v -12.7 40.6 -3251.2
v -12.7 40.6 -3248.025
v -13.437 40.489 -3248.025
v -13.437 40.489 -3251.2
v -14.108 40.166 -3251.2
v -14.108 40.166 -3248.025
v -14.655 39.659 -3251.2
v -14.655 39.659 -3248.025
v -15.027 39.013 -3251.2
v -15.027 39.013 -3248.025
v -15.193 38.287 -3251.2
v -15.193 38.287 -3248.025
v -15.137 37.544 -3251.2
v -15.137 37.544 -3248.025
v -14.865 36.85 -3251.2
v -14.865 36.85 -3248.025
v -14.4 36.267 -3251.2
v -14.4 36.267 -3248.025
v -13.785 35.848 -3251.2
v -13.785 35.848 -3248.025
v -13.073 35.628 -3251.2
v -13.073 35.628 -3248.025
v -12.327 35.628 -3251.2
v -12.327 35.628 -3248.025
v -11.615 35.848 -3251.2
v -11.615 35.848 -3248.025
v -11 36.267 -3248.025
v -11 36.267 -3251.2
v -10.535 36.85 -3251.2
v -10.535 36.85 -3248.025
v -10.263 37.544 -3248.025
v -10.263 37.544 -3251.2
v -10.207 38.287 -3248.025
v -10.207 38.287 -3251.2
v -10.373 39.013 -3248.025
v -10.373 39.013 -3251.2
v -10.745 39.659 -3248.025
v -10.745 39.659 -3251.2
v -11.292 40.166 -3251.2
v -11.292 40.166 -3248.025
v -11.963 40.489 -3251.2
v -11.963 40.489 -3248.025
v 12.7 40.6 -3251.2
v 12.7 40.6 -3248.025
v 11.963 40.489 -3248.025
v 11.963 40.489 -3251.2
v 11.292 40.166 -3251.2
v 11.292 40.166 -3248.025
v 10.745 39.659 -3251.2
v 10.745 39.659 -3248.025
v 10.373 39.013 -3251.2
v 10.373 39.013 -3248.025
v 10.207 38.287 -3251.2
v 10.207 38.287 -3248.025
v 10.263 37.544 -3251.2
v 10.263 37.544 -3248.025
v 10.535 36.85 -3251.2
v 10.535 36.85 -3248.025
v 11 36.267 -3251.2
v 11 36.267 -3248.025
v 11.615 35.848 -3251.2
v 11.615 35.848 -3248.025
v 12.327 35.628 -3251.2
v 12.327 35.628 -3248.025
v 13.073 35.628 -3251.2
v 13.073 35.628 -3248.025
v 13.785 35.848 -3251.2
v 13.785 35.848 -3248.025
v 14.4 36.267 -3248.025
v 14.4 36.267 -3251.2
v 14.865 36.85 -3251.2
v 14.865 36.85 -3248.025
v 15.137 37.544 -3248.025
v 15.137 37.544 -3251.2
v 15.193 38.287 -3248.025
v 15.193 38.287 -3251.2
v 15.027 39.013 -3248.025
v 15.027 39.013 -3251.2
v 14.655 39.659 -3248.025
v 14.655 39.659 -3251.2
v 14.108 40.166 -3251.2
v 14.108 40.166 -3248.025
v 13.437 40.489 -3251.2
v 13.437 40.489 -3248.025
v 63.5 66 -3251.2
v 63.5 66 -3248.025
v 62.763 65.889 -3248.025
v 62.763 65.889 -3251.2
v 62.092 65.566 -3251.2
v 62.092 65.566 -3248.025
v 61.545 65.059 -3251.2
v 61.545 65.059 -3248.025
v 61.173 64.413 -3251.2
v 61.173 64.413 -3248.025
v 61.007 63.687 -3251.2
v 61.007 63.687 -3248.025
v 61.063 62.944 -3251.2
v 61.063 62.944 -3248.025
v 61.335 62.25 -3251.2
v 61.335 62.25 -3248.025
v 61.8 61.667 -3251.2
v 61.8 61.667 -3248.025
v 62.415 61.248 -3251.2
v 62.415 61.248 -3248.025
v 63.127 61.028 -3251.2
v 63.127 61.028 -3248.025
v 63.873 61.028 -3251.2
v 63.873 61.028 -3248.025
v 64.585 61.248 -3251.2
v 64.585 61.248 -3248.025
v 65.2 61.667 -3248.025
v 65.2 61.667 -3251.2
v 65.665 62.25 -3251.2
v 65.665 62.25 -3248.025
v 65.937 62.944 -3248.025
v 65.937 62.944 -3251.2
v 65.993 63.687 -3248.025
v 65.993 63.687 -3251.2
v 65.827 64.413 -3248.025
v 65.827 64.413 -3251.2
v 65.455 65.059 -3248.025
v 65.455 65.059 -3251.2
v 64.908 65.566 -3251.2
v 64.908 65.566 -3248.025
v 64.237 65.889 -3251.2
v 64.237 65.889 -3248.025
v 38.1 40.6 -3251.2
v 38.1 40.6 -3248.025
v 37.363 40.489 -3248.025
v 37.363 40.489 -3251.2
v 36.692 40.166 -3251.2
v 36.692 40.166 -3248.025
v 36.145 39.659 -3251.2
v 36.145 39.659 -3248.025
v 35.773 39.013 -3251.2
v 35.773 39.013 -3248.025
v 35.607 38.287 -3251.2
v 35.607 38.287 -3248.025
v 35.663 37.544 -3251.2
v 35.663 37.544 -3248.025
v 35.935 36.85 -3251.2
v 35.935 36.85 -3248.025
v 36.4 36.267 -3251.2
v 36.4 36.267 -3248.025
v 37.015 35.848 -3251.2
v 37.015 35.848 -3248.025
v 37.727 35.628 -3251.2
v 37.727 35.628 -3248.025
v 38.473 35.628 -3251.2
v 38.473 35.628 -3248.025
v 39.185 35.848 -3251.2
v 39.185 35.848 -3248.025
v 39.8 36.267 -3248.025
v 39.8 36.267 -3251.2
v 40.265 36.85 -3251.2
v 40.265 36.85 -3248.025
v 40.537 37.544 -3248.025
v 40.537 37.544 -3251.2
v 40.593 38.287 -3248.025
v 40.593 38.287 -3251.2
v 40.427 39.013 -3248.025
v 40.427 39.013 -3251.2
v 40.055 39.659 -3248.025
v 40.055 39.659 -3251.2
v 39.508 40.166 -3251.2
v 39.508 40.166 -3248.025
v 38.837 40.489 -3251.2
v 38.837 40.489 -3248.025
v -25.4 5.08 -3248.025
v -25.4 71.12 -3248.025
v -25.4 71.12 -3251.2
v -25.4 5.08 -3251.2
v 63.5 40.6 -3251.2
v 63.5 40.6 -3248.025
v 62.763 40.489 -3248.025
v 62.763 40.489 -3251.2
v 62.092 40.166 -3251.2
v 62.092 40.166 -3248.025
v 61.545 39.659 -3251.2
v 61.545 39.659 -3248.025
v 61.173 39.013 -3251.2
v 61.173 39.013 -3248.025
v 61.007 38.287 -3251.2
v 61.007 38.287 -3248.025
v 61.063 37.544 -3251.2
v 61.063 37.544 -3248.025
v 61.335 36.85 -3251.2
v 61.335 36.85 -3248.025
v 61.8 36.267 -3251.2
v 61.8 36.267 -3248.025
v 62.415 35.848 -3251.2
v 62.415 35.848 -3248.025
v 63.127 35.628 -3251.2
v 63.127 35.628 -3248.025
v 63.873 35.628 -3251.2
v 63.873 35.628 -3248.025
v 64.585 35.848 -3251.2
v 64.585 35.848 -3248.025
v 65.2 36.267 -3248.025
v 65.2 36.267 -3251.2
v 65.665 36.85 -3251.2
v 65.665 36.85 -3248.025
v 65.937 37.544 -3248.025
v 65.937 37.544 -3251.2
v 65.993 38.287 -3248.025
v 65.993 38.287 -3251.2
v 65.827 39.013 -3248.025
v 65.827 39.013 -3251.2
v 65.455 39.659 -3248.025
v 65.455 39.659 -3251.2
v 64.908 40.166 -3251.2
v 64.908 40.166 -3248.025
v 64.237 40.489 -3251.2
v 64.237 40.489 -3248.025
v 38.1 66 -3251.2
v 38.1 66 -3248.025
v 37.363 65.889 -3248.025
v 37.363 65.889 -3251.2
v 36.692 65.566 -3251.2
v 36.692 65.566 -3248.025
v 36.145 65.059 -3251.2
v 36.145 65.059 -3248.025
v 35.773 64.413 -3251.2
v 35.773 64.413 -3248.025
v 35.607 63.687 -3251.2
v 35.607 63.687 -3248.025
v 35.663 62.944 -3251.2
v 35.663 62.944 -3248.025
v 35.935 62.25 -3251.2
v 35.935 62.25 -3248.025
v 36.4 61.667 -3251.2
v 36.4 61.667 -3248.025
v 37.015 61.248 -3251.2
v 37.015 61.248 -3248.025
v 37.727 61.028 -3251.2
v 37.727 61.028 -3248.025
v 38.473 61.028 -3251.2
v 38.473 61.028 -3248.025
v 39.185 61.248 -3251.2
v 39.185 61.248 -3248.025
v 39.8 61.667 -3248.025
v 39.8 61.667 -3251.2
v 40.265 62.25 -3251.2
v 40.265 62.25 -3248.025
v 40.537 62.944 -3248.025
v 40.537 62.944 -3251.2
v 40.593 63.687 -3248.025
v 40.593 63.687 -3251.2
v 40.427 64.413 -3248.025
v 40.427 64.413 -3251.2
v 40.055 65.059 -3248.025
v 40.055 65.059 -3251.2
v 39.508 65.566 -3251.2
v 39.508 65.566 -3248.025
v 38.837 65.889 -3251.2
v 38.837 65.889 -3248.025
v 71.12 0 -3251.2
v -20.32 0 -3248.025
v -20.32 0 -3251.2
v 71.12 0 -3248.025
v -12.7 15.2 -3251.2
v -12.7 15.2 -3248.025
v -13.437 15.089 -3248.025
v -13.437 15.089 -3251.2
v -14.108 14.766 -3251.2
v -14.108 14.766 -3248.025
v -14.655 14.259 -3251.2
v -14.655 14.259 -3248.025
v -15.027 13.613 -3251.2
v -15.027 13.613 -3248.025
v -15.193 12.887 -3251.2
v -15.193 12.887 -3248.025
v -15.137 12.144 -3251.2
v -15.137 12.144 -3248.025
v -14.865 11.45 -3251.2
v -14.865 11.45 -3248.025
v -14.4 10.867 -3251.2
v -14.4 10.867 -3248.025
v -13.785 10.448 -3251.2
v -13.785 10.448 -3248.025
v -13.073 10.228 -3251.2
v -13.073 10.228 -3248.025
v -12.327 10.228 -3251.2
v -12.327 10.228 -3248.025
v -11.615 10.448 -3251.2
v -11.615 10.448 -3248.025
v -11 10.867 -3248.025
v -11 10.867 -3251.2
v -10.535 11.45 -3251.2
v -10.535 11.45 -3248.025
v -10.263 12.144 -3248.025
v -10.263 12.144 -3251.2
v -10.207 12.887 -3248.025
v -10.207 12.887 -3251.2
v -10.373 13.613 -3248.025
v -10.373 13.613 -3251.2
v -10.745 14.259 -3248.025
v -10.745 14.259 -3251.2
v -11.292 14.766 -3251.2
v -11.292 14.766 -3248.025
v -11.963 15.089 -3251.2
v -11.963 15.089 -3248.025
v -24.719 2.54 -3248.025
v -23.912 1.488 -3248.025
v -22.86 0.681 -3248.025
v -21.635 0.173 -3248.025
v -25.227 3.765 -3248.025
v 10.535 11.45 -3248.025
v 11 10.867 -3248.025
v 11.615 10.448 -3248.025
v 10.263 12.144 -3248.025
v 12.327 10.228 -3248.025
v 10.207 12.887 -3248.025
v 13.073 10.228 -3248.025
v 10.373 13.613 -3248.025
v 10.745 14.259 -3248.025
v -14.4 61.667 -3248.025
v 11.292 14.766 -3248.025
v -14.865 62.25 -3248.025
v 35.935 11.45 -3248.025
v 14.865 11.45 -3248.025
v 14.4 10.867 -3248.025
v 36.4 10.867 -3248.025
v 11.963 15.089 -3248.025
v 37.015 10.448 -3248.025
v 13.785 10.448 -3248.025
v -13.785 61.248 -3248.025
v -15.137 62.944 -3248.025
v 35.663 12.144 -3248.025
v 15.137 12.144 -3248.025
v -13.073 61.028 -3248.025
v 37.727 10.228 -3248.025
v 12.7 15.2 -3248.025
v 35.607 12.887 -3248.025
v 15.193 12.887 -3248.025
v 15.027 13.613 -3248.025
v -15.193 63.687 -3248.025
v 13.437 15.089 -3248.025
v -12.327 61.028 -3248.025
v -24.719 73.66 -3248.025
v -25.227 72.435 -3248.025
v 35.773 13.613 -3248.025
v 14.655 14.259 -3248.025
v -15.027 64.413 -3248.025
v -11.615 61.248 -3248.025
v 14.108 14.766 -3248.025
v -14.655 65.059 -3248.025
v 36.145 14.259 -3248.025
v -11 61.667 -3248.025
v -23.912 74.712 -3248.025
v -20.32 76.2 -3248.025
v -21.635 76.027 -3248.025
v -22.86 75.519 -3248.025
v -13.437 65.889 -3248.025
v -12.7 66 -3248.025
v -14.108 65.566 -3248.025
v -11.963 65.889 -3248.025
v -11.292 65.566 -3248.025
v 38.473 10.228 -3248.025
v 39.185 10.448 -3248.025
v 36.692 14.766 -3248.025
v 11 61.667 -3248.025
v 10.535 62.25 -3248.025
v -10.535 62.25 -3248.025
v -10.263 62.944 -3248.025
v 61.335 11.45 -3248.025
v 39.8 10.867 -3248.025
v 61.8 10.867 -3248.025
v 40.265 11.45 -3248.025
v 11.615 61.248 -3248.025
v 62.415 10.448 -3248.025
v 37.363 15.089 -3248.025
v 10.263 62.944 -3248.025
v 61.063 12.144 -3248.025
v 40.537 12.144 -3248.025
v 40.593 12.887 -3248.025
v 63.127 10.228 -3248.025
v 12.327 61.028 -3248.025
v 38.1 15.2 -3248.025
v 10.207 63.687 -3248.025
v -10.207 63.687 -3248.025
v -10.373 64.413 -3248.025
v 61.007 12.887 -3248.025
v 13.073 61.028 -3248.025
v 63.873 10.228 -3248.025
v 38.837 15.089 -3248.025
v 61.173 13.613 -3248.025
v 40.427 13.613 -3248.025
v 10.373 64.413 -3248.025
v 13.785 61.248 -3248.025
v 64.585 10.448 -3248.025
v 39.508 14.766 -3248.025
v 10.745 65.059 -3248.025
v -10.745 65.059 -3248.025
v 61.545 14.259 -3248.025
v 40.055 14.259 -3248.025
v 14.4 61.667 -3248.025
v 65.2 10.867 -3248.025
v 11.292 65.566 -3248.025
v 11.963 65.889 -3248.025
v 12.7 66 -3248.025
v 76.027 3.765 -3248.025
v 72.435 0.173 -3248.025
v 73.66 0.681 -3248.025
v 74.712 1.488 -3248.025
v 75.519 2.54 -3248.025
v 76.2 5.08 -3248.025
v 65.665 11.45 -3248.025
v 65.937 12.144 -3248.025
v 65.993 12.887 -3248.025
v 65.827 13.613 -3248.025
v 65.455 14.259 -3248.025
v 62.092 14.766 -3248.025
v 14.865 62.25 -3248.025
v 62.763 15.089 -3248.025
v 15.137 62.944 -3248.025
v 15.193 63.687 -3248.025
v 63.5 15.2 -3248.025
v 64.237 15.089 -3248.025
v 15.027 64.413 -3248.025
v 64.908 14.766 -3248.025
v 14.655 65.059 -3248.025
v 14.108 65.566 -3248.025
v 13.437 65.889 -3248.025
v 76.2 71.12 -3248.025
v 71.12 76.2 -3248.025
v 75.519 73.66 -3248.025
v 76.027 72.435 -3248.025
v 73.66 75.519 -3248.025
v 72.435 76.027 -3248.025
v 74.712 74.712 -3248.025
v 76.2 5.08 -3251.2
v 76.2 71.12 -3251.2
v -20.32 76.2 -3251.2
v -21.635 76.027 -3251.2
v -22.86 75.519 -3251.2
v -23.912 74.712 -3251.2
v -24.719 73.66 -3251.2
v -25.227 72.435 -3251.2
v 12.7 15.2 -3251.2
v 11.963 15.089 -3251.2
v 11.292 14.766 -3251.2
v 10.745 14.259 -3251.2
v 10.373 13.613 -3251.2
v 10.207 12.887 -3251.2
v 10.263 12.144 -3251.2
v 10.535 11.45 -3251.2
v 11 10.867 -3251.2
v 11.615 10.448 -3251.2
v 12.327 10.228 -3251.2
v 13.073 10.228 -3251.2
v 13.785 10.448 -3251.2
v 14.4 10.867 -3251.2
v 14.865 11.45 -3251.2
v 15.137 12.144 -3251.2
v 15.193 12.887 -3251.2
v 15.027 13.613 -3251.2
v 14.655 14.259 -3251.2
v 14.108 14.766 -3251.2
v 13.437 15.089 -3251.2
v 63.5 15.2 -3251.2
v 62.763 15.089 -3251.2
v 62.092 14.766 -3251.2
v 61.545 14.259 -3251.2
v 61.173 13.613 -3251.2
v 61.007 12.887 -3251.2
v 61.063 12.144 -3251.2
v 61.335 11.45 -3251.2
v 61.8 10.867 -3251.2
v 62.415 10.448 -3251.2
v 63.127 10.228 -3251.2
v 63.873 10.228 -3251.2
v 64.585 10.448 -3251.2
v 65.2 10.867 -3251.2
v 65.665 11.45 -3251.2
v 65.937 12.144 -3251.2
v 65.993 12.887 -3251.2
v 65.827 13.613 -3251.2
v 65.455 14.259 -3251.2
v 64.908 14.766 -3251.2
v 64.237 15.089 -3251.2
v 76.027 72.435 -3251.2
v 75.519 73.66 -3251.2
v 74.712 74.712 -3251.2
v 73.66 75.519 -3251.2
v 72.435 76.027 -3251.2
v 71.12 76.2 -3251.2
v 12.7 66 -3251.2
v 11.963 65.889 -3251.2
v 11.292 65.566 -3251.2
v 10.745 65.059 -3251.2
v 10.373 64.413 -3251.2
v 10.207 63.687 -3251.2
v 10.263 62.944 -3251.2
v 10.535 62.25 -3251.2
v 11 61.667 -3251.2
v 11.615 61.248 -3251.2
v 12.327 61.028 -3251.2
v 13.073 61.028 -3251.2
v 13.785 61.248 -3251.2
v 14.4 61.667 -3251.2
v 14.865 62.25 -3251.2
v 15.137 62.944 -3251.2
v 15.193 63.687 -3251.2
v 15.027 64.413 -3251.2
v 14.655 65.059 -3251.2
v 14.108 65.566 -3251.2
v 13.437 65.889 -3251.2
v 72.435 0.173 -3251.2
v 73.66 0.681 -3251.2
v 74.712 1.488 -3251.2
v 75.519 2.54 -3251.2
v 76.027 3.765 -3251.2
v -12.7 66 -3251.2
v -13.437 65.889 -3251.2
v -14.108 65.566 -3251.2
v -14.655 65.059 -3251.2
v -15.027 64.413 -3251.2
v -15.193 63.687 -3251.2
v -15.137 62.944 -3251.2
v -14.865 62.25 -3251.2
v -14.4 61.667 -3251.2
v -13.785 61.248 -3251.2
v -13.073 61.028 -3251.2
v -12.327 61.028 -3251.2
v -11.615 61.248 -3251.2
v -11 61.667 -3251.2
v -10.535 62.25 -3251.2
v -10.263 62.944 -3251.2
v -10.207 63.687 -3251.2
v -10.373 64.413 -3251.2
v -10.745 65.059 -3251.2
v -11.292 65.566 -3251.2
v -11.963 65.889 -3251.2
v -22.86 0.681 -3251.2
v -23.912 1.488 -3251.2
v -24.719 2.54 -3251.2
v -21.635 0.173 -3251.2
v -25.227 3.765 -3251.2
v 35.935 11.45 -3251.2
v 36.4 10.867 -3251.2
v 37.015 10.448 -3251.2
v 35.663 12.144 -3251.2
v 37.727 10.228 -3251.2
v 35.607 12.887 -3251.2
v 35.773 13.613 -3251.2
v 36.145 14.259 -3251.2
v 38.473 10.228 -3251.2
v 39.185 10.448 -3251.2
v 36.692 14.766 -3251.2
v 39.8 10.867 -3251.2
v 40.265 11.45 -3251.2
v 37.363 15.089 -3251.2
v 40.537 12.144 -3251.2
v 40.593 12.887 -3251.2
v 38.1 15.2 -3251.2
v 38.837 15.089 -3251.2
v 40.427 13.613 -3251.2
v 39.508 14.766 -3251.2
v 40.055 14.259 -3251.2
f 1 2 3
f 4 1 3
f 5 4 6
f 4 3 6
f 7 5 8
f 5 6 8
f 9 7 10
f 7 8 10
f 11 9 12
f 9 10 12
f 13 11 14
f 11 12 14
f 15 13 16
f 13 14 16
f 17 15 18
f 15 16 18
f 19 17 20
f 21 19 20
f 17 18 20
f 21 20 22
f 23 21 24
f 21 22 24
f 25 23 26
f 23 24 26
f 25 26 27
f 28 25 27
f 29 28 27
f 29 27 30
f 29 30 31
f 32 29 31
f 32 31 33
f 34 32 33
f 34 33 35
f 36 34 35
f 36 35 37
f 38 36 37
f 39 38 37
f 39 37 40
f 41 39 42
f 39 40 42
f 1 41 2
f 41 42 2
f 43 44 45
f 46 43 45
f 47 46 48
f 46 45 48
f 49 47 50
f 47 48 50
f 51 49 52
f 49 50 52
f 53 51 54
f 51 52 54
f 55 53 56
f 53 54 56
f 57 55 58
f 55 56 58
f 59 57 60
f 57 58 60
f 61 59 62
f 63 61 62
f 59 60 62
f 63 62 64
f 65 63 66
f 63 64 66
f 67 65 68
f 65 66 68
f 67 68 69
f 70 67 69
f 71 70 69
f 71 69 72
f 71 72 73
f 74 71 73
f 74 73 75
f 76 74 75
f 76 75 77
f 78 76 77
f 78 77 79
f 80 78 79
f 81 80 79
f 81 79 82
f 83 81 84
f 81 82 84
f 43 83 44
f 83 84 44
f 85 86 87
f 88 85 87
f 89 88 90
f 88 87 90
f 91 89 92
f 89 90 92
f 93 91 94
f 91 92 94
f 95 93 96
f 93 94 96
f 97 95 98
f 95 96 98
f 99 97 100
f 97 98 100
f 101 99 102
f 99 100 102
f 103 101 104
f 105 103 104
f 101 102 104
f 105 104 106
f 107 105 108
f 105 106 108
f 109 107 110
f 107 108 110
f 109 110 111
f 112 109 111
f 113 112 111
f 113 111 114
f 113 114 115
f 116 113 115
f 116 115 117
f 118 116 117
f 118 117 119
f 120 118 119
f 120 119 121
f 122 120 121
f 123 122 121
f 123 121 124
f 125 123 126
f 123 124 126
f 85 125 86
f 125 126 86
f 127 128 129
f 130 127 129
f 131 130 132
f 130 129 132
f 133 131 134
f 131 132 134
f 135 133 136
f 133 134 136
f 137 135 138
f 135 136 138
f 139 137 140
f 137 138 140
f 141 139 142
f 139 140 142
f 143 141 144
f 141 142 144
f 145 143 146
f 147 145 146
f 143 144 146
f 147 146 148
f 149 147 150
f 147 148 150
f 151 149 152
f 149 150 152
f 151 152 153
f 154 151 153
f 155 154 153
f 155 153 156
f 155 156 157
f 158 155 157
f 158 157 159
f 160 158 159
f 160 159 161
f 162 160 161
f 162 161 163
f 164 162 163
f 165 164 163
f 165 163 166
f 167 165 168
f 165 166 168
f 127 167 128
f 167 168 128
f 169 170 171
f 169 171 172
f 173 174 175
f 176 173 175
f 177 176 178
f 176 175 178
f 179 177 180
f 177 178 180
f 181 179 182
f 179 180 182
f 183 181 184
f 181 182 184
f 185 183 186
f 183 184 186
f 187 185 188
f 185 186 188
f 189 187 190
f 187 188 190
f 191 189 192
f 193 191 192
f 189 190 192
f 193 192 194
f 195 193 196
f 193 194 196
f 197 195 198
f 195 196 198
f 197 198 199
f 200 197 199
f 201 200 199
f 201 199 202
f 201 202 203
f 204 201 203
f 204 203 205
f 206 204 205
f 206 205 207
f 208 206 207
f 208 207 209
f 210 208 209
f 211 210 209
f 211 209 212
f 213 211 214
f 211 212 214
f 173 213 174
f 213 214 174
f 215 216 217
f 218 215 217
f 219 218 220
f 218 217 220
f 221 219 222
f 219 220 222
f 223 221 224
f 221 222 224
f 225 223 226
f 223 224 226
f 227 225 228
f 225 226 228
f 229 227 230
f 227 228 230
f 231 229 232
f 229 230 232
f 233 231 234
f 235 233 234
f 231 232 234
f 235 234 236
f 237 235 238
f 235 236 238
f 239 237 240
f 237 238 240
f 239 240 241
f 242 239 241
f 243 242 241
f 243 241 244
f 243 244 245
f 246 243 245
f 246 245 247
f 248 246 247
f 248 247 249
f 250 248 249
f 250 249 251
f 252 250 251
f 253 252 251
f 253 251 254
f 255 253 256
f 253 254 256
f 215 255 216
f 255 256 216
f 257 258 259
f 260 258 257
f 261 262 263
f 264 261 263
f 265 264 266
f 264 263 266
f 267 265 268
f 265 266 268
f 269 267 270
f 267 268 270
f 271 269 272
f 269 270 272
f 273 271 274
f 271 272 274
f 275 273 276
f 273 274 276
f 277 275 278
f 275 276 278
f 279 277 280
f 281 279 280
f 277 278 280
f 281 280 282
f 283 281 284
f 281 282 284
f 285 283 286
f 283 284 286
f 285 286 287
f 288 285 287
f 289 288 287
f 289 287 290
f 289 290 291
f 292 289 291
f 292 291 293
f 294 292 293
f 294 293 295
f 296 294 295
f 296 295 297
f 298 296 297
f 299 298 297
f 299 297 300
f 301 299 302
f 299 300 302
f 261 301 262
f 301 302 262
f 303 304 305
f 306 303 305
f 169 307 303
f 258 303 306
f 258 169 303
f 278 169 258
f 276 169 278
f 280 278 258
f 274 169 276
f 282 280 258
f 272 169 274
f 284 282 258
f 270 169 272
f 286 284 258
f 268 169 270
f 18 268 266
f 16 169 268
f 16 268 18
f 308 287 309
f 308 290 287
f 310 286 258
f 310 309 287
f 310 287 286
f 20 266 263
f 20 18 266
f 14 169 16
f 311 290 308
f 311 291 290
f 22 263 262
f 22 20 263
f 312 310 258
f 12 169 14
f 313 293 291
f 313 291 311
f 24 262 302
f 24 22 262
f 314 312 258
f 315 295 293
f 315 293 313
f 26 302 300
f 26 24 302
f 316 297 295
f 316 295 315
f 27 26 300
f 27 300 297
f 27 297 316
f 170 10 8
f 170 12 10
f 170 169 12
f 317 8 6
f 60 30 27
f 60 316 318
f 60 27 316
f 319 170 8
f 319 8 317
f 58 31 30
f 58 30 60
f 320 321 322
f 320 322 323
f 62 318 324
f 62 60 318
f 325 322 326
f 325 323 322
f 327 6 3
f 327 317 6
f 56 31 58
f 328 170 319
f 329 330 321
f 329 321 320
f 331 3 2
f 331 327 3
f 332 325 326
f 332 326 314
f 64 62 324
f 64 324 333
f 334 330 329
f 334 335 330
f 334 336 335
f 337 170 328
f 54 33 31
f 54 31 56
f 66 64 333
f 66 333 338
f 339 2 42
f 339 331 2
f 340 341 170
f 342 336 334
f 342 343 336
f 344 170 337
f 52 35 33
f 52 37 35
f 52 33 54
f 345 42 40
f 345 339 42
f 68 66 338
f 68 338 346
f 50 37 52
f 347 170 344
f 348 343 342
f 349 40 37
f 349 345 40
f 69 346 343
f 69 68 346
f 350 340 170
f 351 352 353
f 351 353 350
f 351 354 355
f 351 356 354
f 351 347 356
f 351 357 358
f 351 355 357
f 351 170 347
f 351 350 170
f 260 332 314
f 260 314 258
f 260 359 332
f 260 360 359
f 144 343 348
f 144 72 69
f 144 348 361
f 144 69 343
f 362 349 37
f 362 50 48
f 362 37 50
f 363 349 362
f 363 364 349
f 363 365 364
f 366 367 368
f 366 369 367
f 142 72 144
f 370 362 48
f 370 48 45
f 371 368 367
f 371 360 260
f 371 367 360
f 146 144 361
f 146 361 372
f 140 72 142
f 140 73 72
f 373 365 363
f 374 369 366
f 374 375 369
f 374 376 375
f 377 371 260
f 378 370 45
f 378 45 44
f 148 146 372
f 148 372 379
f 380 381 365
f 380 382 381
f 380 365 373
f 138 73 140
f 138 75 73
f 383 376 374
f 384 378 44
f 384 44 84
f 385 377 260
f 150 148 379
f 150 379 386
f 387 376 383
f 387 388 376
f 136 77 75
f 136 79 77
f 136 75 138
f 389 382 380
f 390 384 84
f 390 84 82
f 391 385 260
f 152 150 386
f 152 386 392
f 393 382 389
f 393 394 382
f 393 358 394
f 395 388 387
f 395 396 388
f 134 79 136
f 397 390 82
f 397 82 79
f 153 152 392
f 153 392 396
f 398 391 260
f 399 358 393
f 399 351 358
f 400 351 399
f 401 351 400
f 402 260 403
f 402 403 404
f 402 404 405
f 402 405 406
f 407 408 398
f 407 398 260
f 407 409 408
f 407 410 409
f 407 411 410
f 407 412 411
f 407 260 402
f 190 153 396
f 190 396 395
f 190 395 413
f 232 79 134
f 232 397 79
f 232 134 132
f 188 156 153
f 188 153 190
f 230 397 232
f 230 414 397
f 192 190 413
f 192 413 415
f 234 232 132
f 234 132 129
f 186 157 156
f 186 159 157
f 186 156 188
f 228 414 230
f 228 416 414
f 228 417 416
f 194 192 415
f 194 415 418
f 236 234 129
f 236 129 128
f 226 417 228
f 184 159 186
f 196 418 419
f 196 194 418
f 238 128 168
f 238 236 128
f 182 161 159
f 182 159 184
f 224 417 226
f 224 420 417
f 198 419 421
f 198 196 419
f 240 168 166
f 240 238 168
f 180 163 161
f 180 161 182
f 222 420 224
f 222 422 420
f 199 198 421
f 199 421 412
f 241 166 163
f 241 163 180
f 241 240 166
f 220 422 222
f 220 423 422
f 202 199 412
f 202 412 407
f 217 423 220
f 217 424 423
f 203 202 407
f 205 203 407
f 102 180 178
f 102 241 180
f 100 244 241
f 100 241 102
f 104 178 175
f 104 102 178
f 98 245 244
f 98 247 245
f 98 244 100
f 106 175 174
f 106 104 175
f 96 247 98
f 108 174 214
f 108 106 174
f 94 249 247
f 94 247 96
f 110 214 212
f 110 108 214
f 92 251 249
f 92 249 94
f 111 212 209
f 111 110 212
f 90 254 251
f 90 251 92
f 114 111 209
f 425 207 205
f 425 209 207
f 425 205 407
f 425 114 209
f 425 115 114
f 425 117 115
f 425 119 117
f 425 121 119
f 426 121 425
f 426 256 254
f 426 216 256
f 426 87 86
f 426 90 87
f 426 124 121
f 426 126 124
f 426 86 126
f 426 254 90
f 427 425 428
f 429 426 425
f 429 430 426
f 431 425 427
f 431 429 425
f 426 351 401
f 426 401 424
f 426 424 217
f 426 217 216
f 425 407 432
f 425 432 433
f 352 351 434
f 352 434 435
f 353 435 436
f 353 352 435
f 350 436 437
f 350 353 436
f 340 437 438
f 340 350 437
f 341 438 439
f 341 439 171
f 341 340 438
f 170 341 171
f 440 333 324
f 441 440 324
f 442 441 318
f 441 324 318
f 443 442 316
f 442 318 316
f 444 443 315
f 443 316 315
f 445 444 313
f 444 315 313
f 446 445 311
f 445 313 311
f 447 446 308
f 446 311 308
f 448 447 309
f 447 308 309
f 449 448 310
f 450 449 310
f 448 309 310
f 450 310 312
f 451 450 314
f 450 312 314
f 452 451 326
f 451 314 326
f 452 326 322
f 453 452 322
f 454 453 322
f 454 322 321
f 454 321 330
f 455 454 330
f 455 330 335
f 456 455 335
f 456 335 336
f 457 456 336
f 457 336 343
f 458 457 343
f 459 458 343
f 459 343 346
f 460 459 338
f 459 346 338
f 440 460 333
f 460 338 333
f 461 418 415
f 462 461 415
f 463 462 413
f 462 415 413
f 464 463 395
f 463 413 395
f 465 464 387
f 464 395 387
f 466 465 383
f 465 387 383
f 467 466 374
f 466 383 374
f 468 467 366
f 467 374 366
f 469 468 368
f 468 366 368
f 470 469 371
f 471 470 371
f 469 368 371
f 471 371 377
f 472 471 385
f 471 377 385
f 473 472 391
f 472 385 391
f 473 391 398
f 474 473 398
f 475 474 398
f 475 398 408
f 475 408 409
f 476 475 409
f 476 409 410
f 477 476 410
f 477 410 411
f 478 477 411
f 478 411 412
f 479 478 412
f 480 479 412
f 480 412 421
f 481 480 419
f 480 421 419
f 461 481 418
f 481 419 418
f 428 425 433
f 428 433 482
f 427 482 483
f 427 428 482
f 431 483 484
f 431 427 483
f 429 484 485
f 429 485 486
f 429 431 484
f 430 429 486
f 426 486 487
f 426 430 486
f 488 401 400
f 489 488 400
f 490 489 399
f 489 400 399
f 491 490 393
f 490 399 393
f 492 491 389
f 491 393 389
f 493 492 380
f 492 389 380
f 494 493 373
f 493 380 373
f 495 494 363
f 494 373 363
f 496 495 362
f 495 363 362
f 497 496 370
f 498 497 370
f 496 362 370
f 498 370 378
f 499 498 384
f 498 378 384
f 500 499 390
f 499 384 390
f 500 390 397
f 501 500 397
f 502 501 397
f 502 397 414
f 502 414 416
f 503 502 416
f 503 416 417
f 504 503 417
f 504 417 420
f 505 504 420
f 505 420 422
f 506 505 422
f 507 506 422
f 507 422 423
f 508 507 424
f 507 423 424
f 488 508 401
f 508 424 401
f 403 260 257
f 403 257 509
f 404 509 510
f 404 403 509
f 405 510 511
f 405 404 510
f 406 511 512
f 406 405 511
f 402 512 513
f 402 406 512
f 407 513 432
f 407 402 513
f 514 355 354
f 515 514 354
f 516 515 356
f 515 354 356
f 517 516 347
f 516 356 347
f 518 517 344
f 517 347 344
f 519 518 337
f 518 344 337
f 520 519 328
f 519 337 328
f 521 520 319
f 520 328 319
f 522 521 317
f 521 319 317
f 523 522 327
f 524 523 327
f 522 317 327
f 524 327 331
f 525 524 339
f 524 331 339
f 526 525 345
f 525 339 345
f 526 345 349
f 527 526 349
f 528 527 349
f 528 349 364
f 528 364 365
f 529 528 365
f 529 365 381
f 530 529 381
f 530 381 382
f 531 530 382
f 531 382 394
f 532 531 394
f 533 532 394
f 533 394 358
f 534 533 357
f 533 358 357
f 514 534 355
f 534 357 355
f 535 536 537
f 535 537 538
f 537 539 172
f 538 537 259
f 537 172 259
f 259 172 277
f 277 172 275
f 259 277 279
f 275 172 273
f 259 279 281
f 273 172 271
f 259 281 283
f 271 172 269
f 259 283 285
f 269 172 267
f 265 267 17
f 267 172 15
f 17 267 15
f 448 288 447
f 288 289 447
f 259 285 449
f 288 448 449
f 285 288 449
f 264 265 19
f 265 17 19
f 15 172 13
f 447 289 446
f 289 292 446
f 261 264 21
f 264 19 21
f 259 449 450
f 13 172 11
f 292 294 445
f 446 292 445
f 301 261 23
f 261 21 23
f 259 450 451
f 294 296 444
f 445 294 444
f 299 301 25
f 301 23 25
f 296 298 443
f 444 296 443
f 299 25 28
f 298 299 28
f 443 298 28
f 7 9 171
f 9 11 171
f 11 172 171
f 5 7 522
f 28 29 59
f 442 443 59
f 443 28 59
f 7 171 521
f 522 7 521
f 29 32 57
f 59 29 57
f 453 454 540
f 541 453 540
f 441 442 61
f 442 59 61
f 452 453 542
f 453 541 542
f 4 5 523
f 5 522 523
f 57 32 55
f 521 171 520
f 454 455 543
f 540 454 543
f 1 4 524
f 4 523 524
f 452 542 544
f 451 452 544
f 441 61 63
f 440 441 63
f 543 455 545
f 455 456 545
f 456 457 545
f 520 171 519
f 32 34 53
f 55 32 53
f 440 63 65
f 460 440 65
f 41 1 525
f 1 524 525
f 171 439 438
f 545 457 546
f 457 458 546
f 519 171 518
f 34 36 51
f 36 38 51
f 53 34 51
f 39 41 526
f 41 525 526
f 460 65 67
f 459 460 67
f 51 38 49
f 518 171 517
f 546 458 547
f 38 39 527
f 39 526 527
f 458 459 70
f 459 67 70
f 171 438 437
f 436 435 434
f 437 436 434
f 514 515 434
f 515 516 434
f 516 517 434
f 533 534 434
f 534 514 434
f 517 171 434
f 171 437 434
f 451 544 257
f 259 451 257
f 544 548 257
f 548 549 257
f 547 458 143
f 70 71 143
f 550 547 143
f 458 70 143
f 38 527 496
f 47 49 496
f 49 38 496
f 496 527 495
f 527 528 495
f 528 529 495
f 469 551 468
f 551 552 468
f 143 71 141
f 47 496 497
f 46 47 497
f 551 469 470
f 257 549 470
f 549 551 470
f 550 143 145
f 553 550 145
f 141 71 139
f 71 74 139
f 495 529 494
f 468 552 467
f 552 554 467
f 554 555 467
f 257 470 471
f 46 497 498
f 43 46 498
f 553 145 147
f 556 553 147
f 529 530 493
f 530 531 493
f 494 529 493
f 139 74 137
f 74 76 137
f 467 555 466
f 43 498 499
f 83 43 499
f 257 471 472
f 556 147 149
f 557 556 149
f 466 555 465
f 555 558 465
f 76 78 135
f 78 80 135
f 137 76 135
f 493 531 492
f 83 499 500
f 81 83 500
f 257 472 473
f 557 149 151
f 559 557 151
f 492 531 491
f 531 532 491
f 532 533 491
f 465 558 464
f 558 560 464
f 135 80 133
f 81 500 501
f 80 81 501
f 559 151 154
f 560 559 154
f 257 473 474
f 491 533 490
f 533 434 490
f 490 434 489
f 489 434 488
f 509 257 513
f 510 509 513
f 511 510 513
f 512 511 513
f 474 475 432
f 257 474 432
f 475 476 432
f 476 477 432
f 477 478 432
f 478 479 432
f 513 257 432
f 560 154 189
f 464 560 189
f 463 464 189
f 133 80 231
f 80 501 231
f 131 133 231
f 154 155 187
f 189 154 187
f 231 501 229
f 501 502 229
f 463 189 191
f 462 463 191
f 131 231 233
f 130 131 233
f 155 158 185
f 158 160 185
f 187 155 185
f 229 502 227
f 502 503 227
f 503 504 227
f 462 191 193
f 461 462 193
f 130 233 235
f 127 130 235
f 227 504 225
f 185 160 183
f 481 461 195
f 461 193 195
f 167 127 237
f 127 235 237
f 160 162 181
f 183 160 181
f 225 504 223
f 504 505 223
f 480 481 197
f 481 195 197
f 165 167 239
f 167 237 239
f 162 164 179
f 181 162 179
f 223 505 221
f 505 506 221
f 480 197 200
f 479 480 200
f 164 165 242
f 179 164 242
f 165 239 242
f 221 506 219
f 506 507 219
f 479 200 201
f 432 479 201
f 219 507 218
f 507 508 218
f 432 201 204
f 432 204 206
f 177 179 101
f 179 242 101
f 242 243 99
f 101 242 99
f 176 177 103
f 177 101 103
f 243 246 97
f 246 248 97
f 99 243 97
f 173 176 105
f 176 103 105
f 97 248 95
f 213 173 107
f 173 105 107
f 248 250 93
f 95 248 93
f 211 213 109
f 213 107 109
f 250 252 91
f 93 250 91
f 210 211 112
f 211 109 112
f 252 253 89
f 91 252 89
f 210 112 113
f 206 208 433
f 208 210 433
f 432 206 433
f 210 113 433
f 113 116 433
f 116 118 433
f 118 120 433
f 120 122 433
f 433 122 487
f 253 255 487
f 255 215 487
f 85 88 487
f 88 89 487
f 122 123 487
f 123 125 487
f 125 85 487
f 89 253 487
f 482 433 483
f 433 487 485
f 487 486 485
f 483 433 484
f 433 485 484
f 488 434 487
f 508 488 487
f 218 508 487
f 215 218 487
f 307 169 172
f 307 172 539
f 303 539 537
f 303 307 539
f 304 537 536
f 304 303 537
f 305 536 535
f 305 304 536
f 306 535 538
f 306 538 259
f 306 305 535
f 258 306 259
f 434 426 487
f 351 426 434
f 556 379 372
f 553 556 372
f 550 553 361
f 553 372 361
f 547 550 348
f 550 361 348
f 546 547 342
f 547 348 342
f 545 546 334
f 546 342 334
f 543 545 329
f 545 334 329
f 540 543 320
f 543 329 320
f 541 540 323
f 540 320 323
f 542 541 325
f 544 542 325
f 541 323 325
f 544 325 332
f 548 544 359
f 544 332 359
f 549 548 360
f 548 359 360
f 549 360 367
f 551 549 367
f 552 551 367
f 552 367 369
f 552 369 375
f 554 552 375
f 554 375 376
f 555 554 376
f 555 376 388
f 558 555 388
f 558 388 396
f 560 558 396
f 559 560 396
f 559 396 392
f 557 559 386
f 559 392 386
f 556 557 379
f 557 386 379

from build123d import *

# Parameters (mm, degrees)
BOSS_EXTRUDE1_START = -3248.025
SKETCH1_R           = 2.5
BOSS_EXTRUDE1_DEPTH = 3.175


with BuildPart() as part:
    # Sketch1 → Boss-Extrude1 (new body)
    with BuildSketch(Plane.XY.offset(BOSS_EXTRUDE1_START)):
        with BuildLine():
            Line((71.12, 76.200000002), (-20.32, 76.200000002))
            ThreePointArc((-20.32, 76.200000002), (-23.912102448, 74.71210245), (-25.4, 71.120000002))
            Line((-25.4, 71.120000002), (-25.4, 5.08))
            ThreePointArc((-25.4, 5.08), (-23.912102448, 1.487897552), (-20.32, 0))
            Line((-20.32, 0), (71.12, 0))
            ThreePointArc((71.12, 0), (74.712102448, 1.487897552), (76.2, 5.08))
            Line((76.2, 5.08), (76.2, 71.120000002))
            ThreePointArc((76.2, 71.120000002), (74.712102448, 74.71210245), (71.12, 76.200000002))
        make_face()
        with Locations(Location((63.5, 63.5, 0), (0, 0, 90))):
            Circle(SKETCH1_R, mode=Mode.SUBTRACT)
        with Locations(Location((63.5, 38.1, 0), (0, 0, 90))):
            Circle(SKETCH1_R, mode=Mode.SUBTRACT)
        with Locations(Location((-12.7, 63.5, 0), (0, 0, 90))):
            Circle(SKETCH1_R, mode=Mode.SUBTRACT)
        with Locations(Location((12.7, 63.5, 0), (0, 0, 90))):
            Circle(SKETCH1_R, mode=Mode.SUBTRACT)
        with Locations(Location((38.1, 63.5, 0), (0, 0, 90))):
            Circle(SKETCH1_R, mode=Mode.SUBTRACT)
        with Locations(Location((-12.7, 38.1, 0), (0, 0, 90))):
            Circle(SKETCH1_R, mode=Mode.SUBTRACT)
        with Locations(Location((12.7, 38.1, 0), (0, 0, 90))):
            Circle(SKETCH1_R, mode=Mode.SUBTRACT)
        with Locations(Location((38.1, 38.1, 0), (0, 0, 90))):
            Circle(SKETCH1_R, mode=Mode.SUBTRACT)
        with Locations(Location((38.1, 12.7, 0), (0, 0, 90))):
            Circle(SKETCH1_R, mode=Mode.SUBTRACT)
        with Locations(Location((12.7, 12.7, 0), (0, 0, 90))):
            Circle(SKETCH1_R, mode=Mode.SUBTRACT)
        with Locations(Location((-12.7, 12.7, 0), (0, 0, 90))):
            Circle(SKETCH1_R, mode=Mode.SUBTRACT)
        with Locations(Location((63.5, 12.7, 0), (0, 0, 90))):
            Circle(SKETCH1_R, mode=Mode.SUBTRACT)
    extrude(amount=-BOSS_EXTRUDE1_DEPTH)


solid = part.part
